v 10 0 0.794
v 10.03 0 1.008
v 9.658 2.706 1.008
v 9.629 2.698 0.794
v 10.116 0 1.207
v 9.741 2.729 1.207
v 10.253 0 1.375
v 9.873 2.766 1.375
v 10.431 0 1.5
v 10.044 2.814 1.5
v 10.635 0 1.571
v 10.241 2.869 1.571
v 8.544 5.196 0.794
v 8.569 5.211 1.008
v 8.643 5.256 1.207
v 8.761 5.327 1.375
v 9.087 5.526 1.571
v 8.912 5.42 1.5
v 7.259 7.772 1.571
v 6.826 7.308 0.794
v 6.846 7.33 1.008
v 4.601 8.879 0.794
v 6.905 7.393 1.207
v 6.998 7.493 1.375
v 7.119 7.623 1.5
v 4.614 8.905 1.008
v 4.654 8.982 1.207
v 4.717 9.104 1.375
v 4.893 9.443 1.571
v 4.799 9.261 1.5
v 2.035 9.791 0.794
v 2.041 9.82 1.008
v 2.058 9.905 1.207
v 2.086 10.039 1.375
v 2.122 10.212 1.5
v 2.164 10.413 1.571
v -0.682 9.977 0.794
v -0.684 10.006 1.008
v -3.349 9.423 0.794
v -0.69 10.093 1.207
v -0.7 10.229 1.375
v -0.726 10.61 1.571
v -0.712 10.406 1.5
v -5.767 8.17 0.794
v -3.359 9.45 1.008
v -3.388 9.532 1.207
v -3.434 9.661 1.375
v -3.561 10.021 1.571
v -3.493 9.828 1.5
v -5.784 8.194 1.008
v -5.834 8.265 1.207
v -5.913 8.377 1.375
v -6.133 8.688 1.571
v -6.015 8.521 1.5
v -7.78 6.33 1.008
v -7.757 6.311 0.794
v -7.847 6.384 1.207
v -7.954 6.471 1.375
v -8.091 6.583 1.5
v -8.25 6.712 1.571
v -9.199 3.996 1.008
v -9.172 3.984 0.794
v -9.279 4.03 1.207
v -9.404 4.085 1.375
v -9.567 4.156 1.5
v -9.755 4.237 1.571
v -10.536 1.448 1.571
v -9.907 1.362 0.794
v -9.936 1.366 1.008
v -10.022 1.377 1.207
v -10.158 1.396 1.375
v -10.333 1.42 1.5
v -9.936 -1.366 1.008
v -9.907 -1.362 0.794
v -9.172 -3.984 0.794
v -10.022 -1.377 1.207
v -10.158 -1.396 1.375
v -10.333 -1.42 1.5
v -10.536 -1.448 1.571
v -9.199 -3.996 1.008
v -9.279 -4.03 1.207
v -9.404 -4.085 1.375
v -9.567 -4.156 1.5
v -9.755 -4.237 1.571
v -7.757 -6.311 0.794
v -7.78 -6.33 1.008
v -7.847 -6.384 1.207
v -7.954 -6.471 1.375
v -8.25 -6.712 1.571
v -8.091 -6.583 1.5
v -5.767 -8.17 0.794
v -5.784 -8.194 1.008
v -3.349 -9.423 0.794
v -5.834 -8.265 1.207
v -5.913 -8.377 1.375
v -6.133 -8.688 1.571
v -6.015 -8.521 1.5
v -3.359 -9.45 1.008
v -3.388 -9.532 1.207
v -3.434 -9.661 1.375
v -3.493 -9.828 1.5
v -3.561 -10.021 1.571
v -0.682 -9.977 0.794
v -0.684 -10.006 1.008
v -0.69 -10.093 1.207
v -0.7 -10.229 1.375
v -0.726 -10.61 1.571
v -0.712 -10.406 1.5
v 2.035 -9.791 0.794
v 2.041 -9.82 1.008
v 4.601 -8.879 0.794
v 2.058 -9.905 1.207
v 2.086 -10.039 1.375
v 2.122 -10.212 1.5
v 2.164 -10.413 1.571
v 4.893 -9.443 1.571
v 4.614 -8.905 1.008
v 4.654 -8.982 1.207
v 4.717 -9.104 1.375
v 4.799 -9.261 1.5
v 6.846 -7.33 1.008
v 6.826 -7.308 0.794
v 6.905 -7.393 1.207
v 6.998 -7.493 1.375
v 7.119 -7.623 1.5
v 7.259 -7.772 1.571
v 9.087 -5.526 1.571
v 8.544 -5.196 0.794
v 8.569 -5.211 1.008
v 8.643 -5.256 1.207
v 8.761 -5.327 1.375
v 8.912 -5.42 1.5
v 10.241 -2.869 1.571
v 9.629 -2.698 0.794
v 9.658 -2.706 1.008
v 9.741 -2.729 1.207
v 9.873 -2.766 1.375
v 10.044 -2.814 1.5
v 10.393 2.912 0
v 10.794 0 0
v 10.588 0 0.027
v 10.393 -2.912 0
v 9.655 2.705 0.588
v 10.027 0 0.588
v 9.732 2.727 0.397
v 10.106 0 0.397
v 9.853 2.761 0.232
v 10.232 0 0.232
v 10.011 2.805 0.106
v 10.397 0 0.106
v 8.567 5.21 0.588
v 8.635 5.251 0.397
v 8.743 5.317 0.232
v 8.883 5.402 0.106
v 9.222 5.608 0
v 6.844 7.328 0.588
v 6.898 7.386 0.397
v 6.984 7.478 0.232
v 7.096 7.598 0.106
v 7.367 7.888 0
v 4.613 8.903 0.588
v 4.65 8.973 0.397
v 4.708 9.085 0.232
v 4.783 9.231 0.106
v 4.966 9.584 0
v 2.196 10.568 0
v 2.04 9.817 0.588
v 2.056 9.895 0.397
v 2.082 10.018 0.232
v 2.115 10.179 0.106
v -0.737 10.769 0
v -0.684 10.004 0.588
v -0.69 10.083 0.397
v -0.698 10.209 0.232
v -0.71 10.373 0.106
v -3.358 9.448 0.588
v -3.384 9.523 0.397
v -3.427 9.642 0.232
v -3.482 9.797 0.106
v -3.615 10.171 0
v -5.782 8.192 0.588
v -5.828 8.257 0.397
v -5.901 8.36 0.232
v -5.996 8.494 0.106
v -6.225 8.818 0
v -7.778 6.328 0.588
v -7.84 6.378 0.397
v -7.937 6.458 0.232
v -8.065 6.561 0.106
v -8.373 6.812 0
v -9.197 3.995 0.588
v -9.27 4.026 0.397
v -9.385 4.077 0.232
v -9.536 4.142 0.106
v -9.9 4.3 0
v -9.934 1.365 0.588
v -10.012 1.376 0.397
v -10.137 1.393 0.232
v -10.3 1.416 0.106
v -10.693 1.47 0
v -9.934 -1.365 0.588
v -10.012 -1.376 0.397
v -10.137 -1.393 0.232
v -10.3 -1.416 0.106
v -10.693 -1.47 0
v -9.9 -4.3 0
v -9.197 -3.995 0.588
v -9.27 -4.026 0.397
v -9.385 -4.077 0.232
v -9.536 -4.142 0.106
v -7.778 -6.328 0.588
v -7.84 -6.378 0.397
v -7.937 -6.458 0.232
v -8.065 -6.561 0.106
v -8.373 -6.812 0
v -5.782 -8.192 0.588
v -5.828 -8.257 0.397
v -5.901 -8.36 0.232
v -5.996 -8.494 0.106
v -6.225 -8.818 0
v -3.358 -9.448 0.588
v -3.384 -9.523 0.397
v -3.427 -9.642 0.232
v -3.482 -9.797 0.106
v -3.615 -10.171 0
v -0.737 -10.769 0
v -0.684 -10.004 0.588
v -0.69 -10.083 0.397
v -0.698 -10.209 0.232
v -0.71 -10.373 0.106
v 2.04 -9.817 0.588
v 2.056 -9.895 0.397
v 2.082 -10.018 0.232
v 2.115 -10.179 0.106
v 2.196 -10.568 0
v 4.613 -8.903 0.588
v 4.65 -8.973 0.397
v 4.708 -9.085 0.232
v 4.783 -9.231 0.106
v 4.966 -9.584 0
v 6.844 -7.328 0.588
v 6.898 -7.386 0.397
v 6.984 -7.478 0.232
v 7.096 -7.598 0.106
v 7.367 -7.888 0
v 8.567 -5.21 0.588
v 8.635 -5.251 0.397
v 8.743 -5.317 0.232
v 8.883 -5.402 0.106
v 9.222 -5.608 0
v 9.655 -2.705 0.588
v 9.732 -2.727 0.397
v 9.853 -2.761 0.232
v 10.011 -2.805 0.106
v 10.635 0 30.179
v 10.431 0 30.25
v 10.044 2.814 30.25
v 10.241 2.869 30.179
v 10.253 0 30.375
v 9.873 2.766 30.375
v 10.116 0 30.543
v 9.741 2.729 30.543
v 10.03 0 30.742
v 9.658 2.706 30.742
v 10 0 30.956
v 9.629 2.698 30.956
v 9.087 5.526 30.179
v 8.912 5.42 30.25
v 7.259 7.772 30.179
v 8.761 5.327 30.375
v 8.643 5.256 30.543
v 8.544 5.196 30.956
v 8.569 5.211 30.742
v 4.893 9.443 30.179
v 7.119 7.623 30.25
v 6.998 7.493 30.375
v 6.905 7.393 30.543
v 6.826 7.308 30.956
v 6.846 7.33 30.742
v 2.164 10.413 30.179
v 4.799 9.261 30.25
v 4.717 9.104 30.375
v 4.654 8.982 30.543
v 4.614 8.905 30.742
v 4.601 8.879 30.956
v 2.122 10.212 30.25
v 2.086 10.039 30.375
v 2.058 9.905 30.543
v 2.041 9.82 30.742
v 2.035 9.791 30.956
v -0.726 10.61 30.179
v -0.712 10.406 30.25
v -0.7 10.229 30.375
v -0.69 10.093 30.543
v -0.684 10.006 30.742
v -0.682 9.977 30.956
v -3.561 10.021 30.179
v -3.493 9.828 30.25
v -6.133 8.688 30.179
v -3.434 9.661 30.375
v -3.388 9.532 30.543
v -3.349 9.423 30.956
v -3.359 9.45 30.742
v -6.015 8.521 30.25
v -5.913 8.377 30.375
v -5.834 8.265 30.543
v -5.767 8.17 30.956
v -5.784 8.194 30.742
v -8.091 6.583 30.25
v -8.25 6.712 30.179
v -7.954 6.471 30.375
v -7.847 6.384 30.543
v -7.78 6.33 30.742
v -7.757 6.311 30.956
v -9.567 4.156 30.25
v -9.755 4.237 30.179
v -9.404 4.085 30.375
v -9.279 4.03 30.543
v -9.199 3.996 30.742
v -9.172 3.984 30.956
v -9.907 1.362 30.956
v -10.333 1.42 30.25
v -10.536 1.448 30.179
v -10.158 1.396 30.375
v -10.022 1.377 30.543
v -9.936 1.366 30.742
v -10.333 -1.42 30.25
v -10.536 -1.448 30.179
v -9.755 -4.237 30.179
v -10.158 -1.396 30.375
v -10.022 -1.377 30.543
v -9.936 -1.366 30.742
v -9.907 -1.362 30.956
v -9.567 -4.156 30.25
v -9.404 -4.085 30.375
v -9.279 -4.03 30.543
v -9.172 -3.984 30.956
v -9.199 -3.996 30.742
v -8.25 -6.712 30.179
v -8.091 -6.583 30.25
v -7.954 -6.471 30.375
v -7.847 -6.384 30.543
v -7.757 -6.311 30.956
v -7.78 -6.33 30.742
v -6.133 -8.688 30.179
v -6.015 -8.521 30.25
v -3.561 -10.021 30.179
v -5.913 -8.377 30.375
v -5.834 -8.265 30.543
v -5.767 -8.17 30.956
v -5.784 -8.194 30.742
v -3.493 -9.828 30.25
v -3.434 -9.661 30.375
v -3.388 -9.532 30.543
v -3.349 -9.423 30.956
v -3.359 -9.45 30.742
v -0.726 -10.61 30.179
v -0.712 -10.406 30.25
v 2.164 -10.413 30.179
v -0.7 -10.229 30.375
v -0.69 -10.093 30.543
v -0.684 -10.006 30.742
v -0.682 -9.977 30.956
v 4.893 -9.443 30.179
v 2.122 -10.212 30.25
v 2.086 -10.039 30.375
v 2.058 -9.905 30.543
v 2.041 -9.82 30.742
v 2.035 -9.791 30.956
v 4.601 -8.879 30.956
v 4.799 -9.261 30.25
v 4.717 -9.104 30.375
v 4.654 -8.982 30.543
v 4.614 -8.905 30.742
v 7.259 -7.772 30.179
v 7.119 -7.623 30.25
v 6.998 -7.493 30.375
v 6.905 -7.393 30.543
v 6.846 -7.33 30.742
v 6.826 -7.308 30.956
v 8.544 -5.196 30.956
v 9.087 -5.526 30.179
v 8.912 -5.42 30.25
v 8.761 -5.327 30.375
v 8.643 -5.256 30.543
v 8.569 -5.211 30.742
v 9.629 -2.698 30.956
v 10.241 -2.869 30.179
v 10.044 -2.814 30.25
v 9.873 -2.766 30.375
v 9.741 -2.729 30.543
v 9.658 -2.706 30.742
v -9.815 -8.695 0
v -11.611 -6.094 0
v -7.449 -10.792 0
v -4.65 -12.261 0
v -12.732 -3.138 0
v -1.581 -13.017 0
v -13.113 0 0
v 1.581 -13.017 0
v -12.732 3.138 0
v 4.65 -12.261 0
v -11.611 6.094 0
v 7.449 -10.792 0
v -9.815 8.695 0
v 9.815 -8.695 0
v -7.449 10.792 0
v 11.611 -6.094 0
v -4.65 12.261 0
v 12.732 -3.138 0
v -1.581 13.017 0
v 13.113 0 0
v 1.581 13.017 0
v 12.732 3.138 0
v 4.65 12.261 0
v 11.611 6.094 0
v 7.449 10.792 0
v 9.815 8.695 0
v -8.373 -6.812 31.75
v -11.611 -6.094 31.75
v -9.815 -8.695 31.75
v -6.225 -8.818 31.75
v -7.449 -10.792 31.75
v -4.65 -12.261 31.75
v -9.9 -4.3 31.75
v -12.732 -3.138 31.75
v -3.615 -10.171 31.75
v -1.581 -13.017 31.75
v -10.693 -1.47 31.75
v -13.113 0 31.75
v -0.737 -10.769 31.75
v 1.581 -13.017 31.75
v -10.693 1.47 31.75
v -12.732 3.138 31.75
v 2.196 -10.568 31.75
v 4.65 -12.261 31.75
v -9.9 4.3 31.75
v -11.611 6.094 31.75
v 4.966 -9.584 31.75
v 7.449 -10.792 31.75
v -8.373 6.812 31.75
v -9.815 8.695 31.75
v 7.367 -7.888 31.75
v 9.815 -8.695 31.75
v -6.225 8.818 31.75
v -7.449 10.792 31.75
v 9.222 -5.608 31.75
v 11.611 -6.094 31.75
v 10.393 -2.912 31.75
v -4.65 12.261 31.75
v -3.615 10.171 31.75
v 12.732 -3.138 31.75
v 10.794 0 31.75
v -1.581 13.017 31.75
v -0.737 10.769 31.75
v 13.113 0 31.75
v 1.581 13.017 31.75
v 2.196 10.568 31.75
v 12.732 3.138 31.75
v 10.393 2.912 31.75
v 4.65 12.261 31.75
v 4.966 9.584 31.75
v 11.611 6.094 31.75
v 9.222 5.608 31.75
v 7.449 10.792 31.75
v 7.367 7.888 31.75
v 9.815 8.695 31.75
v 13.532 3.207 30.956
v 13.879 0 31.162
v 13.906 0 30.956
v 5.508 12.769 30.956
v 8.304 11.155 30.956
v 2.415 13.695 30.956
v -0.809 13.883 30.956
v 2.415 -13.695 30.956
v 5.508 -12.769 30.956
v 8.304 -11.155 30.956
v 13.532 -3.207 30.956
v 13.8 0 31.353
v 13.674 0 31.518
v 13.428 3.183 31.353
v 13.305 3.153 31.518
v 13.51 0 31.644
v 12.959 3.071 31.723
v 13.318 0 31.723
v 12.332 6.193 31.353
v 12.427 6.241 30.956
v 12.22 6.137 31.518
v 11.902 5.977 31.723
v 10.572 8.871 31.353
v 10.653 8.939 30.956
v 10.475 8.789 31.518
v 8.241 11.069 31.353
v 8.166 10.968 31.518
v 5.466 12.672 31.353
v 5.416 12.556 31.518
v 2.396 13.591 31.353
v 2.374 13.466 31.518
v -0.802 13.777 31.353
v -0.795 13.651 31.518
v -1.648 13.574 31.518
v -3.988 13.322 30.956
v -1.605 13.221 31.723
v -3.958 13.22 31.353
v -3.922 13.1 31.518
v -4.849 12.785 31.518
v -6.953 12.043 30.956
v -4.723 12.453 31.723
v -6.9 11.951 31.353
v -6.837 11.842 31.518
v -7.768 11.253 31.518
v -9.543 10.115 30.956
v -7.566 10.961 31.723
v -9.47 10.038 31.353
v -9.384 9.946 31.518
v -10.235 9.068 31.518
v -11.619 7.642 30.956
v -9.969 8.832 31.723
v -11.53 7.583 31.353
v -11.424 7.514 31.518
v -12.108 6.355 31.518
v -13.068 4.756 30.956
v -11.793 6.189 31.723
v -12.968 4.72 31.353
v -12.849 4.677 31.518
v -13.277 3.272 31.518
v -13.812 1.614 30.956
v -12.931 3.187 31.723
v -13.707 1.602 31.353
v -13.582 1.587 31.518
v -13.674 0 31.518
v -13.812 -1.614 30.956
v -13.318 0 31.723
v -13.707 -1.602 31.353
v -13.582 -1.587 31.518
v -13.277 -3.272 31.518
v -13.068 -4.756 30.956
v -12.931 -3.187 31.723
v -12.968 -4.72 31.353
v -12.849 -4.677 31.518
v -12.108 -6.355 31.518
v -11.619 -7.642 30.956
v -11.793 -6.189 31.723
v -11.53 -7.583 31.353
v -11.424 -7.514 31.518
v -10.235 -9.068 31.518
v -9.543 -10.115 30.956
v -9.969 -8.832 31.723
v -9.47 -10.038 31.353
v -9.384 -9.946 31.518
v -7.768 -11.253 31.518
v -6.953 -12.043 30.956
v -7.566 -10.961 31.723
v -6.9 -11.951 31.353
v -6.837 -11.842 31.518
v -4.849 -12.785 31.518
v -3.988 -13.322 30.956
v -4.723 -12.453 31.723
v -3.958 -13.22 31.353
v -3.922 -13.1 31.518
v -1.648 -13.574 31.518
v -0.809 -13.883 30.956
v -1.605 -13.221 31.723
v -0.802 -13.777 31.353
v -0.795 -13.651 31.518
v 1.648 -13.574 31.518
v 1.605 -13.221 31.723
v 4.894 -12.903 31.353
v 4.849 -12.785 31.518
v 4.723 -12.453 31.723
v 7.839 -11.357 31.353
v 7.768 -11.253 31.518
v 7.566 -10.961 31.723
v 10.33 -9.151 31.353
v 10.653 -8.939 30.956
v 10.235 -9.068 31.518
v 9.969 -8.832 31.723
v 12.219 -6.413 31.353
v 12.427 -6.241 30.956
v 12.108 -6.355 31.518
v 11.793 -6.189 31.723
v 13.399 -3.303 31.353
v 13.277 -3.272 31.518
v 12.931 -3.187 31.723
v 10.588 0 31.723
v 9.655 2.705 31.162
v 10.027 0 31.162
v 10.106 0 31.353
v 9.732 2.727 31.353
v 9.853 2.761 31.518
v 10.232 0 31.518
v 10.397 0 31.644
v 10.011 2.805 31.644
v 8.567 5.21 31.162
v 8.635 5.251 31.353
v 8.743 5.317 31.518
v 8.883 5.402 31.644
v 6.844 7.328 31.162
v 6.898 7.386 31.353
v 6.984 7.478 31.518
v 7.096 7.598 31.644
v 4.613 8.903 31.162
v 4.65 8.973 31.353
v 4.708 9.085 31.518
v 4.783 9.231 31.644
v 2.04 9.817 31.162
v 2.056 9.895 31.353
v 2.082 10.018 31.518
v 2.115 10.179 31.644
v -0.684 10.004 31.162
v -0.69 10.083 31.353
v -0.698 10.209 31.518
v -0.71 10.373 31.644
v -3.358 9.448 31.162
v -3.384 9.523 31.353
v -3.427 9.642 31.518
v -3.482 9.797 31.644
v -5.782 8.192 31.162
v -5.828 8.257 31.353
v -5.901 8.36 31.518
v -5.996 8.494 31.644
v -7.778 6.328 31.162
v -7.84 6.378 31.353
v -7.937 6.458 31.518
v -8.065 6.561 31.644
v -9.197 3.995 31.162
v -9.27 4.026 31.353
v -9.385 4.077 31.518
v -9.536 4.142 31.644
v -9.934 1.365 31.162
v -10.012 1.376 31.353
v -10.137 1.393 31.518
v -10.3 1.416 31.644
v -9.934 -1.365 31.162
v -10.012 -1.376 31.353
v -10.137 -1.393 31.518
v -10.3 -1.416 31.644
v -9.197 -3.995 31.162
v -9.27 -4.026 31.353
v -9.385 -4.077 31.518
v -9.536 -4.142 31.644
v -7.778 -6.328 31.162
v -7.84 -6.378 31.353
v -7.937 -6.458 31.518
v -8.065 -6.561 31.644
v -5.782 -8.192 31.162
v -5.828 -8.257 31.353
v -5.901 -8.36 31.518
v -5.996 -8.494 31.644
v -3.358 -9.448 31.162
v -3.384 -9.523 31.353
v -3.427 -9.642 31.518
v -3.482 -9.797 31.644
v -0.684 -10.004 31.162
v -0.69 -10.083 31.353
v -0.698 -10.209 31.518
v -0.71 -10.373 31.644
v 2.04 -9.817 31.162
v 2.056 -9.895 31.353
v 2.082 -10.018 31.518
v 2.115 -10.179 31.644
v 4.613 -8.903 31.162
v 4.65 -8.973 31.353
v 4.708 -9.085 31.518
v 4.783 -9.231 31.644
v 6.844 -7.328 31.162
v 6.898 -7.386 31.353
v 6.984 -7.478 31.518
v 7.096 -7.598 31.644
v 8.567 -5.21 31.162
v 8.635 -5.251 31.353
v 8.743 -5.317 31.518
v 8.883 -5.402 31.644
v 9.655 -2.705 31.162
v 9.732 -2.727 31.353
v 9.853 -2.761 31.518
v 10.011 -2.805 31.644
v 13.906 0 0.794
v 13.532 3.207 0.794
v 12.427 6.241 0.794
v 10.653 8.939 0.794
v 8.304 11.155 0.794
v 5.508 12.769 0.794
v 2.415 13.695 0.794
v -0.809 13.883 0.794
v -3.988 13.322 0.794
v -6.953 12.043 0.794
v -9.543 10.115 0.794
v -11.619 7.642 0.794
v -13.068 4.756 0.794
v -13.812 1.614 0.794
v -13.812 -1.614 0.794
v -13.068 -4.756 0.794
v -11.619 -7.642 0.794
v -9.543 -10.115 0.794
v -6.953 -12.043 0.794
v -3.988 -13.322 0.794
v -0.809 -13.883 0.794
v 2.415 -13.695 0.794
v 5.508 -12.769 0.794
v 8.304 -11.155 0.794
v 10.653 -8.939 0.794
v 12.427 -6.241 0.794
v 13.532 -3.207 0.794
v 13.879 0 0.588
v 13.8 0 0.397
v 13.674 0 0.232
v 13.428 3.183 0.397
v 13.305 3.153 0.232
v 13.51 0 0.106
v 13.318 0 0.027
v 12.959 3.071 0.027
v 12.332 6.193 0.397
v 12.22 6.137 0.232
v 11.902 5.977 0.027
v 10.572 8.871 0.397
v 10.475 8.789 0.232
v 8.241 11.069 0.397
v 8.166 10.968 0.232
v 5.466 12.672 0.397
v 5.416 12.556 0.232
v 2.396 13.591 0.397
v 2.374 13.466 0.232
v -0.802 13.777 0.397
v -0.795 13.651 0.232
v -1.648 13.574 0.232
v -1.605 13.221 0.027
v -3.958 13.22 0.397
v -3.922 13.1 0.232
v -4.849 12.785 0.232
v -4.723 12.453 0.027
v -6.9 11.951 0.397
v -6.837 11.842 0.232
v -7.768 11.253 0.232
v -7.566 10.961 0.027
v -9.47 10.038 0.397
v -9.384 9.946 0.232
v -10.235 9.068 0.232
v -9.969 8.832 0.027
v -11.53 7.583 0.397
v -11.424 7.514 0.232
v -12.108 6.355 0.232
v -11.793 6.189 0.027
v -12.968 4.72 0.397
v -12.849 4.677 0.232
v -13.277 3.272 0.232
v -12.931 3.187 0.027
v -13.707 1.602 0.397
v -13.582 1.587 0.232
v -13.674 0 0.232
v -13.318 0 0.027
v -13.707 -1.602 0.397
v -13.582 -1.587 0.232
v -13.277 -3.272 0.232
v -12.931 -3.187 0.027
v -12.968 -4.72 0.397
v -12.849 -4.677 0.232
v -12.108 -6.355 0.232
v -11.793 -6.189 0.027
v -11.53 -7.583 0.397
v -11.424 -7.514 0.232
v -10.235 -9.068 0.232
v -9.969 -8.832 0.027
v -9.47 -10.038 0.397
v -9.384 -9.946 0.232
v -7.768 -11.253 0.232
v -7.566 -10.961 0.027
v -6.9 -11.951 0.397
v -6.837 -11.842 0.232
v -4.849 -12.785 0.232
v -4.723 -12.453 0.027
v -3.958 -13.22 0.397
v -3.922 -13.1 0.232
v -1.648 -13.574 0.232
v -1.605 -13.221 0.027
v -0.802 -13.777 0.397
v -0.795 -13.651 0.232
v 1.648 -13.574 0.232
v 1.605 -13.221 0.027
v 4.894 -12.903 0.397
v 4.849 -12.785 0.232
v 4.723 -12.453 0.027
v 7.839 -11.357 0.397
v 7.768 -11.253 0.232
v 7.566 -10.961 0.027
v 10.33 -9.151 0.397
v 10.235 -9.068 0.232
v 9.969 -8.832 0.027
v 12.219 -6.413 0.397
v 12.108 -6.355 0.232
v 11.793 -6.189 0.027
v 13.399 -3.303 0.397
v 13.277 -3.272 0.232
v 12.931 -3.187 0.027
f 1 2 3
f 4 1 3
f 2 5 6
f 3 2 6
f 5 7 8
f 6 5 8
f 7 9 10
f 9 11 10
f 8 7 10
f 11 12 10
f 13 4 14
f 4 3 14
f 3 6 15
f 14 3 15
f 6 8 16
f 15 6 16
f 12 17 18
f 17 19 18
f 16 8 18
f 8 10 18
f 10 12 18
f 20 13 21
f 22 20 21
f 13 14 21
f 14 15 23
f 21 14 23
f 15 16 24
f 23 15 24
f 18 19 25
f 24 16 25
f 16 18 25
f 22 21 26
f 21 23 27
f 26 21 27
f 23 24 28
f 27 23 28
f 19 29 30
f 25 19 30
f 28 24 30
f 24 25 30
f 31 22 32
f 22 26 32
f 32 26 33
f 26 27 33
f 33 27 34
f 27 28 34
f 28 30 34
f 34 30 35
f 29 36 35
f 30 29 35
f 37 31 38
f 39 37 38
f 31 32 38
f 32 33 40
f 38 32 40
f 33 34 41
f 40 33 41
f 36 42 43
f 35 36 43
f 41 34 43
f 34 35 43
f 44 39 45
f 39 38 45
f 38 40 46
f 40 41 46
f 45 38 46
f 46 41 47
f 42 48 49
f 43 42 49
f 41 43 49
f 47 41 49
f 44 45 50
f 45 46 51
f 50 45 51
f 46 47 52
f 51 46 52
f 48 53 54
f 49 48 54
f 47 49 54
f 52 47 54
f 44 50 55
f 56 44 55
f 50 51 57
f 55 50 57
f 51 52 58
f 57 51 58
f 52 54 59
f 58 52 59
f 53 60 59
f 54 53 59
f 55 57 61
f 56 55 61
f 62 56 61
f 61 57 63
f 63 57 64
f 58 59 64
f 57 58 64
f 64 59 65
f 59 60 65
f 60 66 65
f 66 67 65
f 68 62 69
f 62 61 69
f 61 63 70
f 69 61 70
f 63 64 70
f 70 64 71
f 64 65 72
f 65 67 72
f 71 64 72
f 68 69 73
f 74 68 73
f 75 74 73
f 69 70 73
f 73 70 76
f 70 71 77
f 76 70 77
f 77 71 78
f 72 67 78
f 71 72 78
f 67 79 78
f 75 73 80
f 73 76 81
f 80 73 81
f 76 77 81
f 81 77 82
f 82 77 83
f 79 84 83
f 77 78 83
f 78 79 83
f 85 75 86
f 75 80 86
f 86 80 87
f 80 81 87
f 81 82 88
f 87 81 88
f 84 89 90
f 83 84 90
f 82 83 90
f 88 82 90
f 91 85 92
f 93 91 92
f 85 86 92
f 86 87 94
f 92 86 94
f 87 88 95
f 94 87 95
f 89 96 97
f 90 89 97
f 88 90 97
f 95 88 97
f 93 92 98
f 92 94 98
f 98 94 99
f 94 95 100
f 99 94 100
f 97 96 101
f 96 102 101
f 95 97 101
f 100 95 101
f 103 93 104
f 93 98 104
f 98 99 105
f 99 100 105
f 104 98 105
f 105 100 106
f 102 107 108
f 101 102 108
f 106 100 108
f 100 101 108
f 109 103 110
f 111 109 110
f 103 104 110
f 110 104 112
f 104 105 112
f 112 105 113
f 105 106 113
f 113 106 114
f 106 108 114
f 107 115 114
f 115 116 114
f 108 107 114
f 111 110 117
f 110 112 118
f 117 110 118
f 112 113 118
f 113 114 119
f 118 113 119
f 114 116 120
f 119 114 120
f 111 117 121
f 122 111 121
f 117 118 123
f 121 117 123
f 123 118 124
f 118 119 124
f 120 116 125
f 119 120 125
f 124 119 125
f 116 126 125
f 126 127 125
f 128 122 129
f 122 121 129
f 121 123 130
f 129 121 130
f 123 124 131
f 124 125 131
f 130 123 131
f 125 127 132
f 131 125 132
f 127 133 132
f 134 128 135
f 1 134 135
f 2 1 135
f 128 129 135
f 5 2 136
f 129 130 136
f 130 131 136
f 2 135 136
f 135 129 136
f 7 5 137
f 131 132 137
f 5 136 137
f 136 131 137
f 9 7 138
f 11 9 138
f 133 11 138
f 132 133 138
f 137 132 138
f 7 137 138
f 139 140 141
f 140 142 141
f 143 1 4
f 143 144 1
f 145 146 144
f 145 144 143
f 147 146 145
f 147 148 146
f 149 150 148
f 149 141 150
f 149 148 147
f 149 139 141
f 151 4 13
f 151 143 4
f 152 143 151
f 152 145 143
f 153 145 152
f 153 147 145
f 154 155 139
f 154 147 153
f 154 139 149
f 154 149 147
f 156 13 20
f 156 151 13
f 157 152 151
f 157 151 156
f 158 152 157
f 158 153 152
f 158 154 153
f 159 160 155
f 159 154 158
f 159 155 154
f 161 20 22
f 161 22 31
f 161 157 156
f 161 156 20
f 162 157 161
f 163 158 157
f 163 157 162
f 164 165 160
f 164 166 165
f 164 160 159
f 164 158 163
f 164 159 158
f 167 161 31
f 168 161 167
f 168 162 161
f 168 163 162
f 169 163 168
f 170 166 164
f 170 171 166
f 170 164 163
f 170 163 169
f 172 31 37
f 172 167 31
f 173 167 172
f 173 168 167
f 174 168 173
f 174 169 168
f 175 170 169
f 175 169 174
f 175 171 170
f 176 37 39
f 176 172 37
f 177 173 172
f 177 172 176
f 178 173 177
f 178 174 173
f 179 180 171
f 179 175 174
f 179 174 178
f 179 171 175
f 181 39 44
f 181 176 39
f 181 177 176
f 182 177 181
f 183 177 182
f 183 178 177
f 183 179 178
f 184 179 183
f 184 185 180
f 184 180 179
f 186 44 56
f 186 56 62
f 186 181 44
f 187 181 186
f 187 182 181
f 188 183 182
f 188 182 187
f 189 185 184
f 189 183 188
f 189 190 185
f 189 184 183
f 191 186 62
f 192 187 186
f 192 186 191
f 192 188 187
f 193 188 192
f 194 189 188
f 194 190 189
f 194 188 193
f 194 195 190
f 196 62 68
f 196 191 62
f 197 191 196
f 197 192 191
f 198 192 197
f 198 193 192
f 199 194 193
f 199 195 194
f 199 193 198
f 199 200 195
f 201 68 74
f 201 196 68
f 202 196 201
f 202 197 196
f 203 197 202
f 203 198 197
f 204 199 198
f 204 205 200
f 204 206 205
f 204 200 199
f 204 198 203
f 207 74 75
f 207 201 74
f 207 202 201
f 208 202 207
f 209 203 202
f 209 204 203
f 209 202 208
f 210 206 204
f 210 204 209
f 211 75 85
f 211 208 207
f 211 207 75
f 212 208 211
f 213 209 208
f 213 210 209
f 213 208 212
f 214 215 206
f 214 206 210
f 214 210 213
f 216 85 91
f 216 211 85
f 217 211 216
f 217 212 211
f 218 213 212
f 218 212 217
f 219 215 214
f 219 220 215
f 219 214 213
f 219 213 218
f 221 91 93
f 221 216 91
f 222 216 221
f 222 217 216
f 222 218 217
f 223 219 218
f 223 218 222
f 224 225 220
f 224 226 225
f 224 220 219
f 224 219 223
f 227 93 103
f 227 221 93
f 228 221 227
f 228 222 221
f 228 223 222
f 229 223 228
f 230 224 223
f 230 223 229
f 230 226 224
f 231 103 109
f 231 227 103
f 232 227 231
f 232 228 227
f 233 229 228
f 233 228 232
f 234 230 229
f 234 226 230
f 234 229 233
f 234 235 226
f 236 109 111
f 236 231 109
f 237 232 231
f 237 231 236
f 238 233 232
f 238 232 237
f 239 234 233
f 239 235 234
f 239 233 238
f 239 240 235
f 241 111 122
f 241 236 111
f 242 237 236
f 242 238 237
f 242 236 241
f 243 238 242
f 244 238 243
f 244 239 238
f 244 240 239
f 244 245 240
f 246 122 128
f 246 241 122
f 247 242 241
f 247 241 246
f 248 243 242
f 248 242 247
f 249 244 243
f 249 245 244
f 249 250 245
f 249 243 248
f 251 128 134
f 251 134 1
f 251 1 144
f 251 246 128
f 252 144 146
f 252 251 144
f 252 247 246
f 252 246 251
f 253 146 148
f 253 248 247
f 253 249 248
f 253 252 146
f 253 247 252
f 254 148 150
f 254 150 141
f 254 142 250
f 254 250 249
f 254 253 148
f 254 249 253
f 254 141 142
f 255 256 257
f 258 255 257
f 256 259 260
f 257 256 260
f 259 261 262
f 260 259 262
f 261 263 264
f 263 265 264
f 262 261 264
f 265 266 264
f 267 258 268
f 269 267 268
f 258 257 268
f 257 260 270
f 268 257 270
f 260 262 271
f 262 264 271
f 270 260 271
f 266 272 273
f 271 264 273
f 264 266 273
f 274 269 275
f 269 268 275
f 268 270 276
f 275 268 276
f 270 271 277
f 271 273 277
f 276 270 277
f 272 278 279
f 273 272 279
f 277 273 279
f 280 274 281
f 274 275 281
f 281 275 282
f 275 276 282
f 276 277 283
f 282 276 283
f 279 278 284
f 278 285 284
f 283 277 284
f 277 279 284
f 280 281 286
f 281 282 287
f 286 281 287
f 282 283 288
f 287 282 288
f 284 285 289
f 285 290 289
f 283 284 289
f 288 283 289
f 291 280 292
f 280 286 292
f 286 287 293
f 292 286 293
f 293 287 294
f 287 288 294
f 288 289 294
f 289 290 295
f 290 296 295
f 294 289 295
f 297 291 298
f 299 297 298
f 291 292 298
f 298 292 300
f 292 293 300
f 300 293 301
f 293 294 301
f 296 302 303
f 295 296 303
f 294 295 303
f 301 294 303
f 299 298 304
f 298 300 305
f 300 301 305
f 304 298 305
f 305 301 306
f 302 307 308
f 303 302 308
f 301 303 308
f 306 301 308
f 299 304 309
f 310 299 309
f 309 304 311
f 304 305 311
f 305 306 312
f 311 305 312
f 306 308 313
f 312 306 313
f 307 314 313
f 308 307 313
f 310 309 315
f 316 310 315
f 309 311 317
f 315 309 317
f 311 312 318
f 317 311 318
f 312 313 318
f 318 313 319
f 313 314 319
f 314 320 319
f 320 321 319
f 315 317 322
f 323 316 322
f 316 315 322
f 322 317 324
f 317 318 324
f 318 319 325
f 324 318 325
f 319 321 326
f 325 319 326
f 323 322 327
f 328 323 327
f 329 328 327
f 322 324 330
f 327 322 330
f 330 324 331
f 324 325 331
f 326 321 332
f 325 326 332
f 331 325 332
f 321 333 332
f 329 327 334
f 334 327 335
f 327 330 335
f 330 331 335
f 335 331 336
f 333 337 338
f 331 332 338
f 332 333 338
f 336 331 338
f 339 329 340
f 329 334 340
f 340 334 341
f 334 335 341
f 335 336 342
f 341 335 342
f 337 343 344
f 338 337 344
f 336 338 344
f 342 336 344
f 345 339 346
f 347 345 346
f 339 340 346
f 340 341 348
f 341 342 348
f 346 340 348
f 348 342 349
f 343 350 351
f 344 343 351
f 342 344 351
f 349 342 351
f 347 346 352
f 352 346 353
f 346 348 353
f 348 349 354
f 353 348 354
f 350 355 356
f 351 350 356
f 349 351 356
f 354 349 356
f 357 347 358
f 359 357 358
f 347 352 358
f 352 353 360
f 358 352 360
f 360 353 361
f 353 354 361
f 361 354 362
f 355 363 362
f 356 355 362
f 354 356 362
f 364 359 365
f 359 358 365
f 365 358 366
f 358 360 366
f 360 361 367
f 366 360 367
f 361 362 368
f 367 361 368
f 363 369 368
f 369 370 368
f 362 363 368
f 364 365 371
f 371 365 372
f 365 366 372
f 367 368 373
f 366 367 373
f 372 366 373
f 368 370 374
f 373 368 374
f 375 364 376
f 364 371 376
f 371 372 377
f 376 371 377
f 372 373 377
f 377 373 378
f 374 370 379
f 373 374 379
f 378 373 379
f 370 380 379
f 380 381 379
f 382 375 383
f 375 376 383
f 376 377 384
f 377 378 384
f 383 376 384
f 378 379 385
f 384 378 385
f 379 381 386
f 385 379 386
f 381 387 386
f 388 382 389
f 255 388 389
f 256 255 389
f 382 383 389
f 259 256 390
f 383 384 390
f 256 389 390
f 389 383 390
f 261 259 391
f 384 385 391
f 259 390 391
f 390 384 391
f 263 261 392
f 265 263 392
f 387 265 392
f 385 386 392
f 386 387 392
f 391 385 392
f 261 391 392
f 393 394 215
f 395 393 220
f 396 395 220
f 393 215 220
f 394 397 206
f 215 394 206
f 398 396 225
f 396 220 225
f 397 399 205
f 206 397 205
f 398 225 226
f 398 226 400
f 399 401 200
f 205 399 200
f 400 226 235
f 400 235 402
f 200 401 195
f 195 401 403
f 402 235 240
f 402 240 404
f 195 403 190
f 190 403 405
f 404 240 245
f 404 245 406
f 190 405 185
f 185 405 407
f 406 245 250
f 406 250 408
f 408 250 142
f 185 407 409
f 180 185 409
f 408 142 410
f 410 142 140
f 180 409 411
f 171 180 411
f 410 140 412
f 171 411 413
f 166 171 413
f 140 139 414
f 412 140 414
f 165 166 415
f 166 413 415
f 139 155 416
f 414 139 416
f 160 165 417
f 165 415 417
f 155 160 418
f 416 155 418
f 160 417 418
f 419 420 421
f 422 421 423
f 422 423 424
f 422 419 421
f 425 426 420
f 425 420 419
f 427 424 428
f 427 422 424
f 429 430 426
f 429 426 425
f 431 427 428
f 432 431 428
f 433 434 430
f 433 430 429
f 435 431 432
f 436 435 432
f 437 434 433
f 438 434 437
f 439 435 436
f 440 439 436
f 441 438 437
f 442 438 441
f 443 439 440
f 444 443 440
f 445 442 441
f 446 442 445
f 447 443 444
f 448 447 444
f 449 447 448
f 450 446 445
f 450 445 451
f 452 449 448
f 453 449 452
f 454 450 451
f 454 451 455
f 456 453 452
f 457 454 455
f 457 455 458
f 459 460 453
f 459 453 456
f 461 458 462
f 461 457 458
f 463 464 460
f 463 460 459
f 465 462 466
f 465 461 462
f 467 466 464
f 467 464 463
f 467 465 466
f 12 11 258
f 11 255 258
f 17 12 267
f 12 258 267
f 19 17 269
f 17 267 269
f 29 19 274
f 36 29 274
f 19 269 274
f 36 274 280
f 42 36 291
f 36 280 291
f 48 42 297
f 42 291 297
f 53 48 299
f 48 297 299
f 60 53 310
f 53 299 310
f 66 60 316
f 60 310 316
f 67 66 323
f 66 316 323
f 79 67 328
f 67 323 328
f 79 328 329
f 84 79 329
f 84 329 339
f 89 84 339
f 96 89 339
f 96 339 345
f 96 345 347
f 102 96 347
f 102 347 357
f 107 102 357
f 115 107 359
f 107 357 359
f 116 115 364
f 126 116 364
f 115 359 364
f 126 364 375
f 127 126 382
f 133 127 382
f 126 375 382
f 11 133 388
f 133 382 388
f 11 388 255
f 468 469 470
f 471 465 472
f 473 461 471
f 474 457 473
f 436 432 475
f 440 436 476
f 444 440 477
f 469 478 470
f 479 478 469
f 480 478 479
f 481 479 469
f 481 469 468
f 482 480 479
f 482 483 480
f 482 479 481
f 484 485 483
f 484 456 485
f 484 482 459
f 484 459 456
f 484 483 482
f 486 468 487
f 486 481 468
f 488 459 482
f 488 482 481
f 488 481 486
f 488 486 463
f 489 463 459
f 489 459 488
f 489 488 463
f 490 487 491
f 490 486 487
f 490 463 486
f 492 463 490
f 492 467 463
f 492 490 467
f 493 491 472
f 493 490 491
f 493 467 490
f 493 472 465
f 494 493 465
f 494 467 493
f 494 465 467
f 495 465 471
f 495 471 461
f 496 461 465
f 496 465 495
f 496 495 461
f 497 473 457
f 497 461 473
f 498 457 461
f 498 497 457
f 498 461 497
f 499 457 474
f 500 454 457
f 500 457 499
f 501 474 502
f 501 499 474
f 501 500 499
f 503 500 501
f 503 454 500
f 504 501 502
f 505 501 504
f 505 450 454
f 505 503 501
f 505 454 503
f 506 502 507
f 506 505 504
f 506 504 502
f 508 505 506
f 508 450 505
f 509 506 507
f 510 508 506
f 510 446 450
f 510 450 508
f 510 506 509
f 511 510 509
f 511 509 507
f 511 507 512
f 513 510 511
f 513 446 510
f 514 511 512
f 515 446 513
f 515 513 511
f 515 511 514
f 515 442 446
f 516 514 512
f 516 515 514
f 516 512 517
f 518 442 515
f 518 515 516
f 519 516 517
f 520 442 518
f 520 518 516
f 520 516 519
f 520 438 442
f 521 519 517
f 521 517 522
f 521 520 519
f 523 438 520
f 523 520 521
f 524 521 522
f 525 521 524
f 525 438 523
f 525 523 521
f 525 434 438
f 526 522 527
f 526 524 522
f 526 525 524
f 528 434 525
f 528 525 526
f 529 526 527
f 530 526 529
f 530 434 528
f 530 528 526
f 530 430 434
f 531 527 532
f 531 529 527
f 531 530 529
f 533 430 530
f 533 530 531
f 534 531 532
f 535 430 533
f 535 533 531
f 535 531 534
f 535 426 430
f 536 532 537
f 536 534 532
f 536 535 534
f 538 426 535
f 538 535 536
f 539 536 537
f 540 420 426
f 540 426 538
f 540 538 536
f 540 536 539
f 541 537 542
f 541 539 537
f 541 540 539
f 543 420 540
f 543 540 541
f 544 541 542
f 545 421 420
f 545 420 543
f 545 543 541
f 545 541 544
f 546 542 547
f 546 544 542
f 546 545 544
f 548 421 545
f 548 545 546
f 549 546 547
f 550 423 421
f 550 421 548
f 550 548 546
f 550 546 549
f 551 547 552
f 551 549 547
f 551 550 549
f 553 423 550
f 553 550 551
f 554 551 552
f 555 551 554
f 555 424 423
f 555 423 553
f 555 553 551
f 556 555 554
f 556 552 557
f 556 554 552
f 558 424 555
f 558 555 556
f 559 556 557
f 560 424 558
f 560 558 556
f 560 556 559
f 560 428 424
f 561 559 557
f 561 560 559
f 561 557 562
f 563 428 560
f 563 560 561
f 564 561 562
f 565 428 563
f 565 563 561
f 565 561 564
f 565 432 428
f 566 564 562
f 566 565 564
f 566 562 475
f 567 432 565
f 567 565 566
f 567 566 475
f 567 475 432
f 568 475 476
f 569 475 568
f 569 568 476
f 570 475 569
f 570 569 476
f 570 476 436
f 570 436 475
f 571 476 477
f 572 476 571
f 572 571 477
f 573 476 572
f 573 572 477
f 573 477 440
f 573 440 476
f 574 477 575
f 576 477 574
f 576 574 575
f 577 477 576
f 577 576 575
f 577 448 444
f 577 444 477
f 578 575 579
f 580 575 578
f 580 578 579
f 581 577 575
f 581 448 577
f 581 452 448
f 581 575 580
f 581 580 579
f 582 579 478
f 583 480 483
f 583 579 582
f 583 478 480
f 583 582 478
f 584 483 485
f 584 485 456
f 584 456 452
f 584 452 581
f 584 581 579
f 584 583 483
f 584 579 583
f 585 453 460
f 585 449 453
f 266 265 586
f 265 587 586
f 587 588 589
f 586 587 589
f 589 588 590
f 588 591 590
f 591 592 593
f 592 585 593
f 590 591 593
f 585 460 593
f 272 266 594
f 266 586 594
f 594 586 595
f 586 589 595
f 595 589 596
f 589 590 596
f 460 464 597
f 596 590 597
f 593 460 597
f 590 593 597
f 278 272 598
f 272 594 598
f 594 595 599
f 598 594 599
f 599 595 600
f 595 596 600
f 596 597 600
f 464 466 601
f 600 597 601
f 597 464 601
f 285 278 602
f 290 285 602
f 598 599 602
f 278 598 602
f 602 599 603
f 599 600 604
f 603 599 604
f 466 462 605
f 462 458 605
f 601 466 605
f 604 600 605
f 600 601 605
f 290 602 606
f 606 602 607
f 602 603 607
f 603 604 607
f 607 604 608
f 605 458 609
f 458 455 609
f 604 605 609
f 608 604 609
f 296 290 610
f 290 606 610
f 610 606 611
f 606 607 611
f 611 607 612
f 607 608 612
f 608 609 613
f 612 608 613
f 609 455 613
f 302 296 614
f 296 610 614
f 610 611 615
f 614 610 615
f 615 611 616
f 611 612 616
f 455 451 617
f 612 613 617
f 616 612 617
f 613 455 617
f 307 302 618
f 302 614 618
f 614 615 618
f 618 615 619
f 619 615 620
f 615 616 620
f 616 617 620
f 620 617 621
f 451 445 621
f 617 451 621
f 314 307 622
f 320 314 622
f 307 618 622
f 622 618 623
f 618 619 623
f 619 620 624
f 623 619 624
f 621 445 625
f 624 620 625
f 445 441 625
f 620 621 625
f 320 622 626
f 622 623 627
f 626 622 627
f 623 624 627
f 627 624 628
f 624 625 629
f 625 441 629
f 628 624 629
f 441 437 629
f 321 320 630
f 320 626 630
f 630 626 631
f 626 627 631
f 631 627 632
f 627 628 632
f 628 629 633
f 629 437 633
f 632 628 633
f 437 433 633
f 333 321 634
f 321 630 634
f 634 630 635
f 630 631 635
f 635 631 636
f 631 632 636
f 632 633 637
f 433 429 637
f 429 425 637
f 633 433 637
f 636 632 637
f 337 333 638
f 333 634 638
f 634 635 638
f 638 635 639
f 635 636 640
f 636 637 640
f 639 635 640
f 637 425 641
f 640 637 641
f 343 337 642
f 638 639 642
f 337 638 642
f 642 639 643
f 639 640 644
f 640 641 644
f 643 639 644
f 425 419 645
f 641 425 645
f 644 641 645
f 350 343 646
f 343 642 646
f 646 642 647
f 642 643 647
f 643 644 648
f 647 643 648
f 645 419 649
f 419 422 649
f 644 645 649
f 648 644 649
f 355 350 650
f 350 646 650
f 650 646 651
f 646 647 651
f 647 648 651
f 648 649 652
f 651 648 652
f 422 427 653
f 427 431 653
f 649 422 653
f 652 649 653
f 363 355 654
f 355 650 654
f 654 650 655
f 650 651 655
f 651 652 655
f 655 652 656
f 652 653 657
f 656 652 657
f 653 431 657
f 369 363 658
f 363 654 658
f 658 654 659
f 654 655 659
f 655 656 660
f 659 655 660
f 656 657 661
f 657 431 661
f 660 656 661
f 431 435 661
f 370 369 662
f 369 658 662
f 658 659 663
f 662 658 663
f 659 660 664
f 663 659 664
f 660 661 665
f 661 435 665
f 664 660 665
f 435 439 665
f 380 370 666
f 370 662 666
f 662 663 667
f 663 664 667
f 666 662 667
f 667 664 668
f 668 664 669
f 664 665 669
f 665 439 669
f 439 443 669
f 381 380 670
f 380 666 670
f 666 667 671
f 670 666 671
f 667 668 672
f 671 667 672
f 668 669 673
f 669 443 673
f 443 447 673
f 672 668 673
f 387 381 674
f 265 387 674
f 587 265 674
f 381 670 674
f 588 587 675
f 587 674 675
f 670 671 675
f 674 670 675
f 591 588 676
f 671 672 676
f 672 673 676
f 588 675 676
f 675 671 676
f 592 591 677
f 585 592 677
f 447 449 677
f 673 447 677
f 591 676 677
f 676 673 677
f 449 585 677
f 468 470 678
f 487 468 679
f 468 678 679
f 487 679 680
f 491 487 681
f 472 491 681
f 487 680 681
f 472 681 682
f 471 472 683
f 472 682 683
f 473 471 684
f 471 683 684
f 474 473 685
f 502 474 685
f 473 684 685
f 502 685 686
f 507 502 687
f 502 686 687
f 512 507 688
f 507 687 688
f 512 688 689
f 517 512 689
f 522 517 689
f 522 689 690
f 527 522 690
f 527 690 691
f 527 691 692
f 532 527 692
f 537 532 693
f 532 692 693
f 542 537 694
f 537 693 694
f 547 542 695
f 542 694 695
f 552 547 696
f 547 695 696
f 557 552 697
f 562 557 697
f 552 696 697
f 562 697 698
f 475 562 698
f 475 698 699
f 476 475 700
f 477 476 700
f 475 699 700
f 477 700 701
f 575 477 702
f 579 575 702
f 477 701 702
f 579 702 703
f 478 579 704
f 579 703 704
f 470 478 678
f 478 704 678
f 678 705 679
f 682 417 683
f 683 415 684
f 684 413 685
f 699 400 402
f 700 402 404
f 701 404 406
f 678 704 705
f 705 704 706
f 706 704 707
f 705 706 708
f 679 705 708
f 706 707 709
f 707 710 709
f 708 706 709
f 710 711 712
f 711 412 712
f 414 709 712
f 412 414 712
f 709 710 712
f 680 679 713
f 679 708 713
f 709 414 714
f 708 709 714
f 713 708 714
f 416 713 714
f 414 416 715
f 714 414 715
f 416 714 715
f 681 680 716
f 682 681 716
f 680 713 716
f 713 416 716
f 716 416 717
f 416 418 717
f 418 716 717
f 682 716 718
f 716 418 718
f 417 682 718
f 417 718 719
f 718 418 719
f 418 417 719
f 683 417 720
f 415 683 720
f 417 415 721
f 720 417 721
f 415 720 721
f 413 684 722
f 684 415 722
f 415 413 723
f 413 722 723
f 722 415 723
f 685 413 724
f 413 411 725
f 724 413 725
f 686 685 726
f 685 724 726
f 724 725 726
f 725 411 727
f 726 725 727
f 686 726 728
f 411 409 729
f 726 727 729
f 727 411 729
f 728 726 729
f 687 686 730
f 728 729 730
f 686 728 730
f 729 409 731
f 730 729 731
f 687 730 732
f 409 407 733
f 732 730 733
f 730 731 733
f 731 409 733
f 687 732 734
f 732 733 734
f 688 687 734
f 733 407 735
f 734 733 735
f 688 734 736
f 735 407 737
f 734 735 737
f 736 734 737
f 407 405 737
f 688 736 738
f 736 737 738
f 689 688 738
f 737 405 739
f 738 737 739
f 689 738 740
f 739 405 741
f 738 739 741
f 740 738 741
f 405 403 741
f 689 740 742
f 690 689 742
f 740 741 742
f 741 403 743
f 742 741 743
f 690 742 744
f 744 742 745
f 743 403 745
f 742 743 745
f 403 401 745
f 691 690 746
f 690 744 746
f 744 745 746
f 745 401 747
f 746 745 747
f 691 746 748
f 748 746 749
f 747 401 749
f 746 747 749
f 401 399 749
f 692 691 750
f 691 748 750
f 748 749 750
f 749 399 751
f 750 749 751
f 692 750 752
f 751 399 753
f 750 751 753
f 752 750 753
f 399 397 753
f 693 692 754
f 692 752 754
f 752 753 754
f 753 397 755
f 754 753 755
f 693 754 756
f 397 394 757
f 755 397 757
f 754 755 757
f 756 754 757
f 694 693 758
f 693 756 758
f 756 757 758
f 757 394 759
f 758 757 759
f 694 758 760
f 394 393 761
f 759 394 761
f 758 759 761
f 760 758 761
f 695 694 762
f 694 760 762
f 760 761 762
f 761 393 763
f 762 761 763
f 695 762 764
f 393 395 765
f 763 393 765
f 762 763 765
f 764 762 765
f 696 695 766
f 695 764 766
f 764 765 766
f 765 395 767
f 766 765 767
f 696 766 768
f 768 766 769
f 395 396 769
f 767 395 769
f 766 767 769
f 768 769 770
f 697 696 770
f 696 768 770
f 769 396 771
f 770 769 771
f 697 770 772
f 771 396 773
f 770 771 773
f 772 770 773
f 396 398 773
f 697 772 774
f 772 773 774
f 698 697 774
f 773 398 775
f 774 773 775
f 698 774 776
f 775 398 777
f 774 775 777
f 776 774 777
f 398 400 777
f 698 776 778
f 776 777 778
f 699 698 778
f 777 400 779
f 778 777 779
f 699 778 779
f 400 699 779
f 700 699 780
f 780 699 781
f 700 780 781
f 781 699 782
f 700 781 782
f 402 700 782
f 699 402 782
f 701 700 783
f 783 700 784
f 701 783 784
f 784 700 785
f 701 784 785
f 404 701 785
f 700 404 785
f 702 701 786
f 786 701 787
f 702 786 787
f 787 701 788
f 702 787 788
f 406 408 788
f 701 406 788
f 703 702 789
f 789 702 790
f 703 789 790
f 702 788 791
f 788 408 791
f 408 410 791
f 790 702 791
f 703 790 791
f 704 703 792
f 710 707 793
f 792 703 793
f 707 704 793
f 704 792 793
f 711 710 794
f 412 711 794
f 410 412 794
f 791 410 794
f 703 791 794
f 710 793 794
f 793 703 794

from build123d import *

# Parameters (mm, degrees)
SKETCH1_R           = 13.9065
SKETCH1_R_2         = 10
BOSS_EXTRUDE1_DEPTH = 31.75
FILLET1_R           = 0.79375


# Read off the part's stored shape, not the designer's step: Move Face3
with BuildPart() as part:
    # Sketch1 → Boss-Extrude1 (new body)
    with BuildSketch(Plane.XY):
        Circle(SKETCH1_R)
        Circle(SKETCH1_R_2, mode=Mode.SUBTRACT)
    extrude(amount=BOSS_EXTRUDE1_DEPTH)

    # Fillet1
    fillet1_edges = [part.edges().sort_by_distance(p)[0] for p in [
        (-13.9065, 0, 0),
        (-13.9065, 0, 31.75),
        (-10, 0, 0),
        (-10, 0, 31.75),
    ]]
    fillet(fillet1_edges, radius=FILLET1_R)

    # Move Face3 outline → Move Face3 (revolve, cut)
    with BuildSketch(Plane.XZ):
        with BuildLine():
            Line((10.635, 1.571462993), (10.635, 30.178537007))
            ThreePointArc((10.635, 30.178537007), (10.178913894, 30.454238422), (10, 30.95625))
            Line((10, 30.95625), (10, 0.79375))
            ThreePointArc((10, 0.79375), (10.178913894, 1.295761578), (10.635, 1.571462993))
        make_face()
    revolve(axis=Axis((0, 0, 0), (0, 0, 1)), mode=Mode.SUBTRACT)


solid = part.part
